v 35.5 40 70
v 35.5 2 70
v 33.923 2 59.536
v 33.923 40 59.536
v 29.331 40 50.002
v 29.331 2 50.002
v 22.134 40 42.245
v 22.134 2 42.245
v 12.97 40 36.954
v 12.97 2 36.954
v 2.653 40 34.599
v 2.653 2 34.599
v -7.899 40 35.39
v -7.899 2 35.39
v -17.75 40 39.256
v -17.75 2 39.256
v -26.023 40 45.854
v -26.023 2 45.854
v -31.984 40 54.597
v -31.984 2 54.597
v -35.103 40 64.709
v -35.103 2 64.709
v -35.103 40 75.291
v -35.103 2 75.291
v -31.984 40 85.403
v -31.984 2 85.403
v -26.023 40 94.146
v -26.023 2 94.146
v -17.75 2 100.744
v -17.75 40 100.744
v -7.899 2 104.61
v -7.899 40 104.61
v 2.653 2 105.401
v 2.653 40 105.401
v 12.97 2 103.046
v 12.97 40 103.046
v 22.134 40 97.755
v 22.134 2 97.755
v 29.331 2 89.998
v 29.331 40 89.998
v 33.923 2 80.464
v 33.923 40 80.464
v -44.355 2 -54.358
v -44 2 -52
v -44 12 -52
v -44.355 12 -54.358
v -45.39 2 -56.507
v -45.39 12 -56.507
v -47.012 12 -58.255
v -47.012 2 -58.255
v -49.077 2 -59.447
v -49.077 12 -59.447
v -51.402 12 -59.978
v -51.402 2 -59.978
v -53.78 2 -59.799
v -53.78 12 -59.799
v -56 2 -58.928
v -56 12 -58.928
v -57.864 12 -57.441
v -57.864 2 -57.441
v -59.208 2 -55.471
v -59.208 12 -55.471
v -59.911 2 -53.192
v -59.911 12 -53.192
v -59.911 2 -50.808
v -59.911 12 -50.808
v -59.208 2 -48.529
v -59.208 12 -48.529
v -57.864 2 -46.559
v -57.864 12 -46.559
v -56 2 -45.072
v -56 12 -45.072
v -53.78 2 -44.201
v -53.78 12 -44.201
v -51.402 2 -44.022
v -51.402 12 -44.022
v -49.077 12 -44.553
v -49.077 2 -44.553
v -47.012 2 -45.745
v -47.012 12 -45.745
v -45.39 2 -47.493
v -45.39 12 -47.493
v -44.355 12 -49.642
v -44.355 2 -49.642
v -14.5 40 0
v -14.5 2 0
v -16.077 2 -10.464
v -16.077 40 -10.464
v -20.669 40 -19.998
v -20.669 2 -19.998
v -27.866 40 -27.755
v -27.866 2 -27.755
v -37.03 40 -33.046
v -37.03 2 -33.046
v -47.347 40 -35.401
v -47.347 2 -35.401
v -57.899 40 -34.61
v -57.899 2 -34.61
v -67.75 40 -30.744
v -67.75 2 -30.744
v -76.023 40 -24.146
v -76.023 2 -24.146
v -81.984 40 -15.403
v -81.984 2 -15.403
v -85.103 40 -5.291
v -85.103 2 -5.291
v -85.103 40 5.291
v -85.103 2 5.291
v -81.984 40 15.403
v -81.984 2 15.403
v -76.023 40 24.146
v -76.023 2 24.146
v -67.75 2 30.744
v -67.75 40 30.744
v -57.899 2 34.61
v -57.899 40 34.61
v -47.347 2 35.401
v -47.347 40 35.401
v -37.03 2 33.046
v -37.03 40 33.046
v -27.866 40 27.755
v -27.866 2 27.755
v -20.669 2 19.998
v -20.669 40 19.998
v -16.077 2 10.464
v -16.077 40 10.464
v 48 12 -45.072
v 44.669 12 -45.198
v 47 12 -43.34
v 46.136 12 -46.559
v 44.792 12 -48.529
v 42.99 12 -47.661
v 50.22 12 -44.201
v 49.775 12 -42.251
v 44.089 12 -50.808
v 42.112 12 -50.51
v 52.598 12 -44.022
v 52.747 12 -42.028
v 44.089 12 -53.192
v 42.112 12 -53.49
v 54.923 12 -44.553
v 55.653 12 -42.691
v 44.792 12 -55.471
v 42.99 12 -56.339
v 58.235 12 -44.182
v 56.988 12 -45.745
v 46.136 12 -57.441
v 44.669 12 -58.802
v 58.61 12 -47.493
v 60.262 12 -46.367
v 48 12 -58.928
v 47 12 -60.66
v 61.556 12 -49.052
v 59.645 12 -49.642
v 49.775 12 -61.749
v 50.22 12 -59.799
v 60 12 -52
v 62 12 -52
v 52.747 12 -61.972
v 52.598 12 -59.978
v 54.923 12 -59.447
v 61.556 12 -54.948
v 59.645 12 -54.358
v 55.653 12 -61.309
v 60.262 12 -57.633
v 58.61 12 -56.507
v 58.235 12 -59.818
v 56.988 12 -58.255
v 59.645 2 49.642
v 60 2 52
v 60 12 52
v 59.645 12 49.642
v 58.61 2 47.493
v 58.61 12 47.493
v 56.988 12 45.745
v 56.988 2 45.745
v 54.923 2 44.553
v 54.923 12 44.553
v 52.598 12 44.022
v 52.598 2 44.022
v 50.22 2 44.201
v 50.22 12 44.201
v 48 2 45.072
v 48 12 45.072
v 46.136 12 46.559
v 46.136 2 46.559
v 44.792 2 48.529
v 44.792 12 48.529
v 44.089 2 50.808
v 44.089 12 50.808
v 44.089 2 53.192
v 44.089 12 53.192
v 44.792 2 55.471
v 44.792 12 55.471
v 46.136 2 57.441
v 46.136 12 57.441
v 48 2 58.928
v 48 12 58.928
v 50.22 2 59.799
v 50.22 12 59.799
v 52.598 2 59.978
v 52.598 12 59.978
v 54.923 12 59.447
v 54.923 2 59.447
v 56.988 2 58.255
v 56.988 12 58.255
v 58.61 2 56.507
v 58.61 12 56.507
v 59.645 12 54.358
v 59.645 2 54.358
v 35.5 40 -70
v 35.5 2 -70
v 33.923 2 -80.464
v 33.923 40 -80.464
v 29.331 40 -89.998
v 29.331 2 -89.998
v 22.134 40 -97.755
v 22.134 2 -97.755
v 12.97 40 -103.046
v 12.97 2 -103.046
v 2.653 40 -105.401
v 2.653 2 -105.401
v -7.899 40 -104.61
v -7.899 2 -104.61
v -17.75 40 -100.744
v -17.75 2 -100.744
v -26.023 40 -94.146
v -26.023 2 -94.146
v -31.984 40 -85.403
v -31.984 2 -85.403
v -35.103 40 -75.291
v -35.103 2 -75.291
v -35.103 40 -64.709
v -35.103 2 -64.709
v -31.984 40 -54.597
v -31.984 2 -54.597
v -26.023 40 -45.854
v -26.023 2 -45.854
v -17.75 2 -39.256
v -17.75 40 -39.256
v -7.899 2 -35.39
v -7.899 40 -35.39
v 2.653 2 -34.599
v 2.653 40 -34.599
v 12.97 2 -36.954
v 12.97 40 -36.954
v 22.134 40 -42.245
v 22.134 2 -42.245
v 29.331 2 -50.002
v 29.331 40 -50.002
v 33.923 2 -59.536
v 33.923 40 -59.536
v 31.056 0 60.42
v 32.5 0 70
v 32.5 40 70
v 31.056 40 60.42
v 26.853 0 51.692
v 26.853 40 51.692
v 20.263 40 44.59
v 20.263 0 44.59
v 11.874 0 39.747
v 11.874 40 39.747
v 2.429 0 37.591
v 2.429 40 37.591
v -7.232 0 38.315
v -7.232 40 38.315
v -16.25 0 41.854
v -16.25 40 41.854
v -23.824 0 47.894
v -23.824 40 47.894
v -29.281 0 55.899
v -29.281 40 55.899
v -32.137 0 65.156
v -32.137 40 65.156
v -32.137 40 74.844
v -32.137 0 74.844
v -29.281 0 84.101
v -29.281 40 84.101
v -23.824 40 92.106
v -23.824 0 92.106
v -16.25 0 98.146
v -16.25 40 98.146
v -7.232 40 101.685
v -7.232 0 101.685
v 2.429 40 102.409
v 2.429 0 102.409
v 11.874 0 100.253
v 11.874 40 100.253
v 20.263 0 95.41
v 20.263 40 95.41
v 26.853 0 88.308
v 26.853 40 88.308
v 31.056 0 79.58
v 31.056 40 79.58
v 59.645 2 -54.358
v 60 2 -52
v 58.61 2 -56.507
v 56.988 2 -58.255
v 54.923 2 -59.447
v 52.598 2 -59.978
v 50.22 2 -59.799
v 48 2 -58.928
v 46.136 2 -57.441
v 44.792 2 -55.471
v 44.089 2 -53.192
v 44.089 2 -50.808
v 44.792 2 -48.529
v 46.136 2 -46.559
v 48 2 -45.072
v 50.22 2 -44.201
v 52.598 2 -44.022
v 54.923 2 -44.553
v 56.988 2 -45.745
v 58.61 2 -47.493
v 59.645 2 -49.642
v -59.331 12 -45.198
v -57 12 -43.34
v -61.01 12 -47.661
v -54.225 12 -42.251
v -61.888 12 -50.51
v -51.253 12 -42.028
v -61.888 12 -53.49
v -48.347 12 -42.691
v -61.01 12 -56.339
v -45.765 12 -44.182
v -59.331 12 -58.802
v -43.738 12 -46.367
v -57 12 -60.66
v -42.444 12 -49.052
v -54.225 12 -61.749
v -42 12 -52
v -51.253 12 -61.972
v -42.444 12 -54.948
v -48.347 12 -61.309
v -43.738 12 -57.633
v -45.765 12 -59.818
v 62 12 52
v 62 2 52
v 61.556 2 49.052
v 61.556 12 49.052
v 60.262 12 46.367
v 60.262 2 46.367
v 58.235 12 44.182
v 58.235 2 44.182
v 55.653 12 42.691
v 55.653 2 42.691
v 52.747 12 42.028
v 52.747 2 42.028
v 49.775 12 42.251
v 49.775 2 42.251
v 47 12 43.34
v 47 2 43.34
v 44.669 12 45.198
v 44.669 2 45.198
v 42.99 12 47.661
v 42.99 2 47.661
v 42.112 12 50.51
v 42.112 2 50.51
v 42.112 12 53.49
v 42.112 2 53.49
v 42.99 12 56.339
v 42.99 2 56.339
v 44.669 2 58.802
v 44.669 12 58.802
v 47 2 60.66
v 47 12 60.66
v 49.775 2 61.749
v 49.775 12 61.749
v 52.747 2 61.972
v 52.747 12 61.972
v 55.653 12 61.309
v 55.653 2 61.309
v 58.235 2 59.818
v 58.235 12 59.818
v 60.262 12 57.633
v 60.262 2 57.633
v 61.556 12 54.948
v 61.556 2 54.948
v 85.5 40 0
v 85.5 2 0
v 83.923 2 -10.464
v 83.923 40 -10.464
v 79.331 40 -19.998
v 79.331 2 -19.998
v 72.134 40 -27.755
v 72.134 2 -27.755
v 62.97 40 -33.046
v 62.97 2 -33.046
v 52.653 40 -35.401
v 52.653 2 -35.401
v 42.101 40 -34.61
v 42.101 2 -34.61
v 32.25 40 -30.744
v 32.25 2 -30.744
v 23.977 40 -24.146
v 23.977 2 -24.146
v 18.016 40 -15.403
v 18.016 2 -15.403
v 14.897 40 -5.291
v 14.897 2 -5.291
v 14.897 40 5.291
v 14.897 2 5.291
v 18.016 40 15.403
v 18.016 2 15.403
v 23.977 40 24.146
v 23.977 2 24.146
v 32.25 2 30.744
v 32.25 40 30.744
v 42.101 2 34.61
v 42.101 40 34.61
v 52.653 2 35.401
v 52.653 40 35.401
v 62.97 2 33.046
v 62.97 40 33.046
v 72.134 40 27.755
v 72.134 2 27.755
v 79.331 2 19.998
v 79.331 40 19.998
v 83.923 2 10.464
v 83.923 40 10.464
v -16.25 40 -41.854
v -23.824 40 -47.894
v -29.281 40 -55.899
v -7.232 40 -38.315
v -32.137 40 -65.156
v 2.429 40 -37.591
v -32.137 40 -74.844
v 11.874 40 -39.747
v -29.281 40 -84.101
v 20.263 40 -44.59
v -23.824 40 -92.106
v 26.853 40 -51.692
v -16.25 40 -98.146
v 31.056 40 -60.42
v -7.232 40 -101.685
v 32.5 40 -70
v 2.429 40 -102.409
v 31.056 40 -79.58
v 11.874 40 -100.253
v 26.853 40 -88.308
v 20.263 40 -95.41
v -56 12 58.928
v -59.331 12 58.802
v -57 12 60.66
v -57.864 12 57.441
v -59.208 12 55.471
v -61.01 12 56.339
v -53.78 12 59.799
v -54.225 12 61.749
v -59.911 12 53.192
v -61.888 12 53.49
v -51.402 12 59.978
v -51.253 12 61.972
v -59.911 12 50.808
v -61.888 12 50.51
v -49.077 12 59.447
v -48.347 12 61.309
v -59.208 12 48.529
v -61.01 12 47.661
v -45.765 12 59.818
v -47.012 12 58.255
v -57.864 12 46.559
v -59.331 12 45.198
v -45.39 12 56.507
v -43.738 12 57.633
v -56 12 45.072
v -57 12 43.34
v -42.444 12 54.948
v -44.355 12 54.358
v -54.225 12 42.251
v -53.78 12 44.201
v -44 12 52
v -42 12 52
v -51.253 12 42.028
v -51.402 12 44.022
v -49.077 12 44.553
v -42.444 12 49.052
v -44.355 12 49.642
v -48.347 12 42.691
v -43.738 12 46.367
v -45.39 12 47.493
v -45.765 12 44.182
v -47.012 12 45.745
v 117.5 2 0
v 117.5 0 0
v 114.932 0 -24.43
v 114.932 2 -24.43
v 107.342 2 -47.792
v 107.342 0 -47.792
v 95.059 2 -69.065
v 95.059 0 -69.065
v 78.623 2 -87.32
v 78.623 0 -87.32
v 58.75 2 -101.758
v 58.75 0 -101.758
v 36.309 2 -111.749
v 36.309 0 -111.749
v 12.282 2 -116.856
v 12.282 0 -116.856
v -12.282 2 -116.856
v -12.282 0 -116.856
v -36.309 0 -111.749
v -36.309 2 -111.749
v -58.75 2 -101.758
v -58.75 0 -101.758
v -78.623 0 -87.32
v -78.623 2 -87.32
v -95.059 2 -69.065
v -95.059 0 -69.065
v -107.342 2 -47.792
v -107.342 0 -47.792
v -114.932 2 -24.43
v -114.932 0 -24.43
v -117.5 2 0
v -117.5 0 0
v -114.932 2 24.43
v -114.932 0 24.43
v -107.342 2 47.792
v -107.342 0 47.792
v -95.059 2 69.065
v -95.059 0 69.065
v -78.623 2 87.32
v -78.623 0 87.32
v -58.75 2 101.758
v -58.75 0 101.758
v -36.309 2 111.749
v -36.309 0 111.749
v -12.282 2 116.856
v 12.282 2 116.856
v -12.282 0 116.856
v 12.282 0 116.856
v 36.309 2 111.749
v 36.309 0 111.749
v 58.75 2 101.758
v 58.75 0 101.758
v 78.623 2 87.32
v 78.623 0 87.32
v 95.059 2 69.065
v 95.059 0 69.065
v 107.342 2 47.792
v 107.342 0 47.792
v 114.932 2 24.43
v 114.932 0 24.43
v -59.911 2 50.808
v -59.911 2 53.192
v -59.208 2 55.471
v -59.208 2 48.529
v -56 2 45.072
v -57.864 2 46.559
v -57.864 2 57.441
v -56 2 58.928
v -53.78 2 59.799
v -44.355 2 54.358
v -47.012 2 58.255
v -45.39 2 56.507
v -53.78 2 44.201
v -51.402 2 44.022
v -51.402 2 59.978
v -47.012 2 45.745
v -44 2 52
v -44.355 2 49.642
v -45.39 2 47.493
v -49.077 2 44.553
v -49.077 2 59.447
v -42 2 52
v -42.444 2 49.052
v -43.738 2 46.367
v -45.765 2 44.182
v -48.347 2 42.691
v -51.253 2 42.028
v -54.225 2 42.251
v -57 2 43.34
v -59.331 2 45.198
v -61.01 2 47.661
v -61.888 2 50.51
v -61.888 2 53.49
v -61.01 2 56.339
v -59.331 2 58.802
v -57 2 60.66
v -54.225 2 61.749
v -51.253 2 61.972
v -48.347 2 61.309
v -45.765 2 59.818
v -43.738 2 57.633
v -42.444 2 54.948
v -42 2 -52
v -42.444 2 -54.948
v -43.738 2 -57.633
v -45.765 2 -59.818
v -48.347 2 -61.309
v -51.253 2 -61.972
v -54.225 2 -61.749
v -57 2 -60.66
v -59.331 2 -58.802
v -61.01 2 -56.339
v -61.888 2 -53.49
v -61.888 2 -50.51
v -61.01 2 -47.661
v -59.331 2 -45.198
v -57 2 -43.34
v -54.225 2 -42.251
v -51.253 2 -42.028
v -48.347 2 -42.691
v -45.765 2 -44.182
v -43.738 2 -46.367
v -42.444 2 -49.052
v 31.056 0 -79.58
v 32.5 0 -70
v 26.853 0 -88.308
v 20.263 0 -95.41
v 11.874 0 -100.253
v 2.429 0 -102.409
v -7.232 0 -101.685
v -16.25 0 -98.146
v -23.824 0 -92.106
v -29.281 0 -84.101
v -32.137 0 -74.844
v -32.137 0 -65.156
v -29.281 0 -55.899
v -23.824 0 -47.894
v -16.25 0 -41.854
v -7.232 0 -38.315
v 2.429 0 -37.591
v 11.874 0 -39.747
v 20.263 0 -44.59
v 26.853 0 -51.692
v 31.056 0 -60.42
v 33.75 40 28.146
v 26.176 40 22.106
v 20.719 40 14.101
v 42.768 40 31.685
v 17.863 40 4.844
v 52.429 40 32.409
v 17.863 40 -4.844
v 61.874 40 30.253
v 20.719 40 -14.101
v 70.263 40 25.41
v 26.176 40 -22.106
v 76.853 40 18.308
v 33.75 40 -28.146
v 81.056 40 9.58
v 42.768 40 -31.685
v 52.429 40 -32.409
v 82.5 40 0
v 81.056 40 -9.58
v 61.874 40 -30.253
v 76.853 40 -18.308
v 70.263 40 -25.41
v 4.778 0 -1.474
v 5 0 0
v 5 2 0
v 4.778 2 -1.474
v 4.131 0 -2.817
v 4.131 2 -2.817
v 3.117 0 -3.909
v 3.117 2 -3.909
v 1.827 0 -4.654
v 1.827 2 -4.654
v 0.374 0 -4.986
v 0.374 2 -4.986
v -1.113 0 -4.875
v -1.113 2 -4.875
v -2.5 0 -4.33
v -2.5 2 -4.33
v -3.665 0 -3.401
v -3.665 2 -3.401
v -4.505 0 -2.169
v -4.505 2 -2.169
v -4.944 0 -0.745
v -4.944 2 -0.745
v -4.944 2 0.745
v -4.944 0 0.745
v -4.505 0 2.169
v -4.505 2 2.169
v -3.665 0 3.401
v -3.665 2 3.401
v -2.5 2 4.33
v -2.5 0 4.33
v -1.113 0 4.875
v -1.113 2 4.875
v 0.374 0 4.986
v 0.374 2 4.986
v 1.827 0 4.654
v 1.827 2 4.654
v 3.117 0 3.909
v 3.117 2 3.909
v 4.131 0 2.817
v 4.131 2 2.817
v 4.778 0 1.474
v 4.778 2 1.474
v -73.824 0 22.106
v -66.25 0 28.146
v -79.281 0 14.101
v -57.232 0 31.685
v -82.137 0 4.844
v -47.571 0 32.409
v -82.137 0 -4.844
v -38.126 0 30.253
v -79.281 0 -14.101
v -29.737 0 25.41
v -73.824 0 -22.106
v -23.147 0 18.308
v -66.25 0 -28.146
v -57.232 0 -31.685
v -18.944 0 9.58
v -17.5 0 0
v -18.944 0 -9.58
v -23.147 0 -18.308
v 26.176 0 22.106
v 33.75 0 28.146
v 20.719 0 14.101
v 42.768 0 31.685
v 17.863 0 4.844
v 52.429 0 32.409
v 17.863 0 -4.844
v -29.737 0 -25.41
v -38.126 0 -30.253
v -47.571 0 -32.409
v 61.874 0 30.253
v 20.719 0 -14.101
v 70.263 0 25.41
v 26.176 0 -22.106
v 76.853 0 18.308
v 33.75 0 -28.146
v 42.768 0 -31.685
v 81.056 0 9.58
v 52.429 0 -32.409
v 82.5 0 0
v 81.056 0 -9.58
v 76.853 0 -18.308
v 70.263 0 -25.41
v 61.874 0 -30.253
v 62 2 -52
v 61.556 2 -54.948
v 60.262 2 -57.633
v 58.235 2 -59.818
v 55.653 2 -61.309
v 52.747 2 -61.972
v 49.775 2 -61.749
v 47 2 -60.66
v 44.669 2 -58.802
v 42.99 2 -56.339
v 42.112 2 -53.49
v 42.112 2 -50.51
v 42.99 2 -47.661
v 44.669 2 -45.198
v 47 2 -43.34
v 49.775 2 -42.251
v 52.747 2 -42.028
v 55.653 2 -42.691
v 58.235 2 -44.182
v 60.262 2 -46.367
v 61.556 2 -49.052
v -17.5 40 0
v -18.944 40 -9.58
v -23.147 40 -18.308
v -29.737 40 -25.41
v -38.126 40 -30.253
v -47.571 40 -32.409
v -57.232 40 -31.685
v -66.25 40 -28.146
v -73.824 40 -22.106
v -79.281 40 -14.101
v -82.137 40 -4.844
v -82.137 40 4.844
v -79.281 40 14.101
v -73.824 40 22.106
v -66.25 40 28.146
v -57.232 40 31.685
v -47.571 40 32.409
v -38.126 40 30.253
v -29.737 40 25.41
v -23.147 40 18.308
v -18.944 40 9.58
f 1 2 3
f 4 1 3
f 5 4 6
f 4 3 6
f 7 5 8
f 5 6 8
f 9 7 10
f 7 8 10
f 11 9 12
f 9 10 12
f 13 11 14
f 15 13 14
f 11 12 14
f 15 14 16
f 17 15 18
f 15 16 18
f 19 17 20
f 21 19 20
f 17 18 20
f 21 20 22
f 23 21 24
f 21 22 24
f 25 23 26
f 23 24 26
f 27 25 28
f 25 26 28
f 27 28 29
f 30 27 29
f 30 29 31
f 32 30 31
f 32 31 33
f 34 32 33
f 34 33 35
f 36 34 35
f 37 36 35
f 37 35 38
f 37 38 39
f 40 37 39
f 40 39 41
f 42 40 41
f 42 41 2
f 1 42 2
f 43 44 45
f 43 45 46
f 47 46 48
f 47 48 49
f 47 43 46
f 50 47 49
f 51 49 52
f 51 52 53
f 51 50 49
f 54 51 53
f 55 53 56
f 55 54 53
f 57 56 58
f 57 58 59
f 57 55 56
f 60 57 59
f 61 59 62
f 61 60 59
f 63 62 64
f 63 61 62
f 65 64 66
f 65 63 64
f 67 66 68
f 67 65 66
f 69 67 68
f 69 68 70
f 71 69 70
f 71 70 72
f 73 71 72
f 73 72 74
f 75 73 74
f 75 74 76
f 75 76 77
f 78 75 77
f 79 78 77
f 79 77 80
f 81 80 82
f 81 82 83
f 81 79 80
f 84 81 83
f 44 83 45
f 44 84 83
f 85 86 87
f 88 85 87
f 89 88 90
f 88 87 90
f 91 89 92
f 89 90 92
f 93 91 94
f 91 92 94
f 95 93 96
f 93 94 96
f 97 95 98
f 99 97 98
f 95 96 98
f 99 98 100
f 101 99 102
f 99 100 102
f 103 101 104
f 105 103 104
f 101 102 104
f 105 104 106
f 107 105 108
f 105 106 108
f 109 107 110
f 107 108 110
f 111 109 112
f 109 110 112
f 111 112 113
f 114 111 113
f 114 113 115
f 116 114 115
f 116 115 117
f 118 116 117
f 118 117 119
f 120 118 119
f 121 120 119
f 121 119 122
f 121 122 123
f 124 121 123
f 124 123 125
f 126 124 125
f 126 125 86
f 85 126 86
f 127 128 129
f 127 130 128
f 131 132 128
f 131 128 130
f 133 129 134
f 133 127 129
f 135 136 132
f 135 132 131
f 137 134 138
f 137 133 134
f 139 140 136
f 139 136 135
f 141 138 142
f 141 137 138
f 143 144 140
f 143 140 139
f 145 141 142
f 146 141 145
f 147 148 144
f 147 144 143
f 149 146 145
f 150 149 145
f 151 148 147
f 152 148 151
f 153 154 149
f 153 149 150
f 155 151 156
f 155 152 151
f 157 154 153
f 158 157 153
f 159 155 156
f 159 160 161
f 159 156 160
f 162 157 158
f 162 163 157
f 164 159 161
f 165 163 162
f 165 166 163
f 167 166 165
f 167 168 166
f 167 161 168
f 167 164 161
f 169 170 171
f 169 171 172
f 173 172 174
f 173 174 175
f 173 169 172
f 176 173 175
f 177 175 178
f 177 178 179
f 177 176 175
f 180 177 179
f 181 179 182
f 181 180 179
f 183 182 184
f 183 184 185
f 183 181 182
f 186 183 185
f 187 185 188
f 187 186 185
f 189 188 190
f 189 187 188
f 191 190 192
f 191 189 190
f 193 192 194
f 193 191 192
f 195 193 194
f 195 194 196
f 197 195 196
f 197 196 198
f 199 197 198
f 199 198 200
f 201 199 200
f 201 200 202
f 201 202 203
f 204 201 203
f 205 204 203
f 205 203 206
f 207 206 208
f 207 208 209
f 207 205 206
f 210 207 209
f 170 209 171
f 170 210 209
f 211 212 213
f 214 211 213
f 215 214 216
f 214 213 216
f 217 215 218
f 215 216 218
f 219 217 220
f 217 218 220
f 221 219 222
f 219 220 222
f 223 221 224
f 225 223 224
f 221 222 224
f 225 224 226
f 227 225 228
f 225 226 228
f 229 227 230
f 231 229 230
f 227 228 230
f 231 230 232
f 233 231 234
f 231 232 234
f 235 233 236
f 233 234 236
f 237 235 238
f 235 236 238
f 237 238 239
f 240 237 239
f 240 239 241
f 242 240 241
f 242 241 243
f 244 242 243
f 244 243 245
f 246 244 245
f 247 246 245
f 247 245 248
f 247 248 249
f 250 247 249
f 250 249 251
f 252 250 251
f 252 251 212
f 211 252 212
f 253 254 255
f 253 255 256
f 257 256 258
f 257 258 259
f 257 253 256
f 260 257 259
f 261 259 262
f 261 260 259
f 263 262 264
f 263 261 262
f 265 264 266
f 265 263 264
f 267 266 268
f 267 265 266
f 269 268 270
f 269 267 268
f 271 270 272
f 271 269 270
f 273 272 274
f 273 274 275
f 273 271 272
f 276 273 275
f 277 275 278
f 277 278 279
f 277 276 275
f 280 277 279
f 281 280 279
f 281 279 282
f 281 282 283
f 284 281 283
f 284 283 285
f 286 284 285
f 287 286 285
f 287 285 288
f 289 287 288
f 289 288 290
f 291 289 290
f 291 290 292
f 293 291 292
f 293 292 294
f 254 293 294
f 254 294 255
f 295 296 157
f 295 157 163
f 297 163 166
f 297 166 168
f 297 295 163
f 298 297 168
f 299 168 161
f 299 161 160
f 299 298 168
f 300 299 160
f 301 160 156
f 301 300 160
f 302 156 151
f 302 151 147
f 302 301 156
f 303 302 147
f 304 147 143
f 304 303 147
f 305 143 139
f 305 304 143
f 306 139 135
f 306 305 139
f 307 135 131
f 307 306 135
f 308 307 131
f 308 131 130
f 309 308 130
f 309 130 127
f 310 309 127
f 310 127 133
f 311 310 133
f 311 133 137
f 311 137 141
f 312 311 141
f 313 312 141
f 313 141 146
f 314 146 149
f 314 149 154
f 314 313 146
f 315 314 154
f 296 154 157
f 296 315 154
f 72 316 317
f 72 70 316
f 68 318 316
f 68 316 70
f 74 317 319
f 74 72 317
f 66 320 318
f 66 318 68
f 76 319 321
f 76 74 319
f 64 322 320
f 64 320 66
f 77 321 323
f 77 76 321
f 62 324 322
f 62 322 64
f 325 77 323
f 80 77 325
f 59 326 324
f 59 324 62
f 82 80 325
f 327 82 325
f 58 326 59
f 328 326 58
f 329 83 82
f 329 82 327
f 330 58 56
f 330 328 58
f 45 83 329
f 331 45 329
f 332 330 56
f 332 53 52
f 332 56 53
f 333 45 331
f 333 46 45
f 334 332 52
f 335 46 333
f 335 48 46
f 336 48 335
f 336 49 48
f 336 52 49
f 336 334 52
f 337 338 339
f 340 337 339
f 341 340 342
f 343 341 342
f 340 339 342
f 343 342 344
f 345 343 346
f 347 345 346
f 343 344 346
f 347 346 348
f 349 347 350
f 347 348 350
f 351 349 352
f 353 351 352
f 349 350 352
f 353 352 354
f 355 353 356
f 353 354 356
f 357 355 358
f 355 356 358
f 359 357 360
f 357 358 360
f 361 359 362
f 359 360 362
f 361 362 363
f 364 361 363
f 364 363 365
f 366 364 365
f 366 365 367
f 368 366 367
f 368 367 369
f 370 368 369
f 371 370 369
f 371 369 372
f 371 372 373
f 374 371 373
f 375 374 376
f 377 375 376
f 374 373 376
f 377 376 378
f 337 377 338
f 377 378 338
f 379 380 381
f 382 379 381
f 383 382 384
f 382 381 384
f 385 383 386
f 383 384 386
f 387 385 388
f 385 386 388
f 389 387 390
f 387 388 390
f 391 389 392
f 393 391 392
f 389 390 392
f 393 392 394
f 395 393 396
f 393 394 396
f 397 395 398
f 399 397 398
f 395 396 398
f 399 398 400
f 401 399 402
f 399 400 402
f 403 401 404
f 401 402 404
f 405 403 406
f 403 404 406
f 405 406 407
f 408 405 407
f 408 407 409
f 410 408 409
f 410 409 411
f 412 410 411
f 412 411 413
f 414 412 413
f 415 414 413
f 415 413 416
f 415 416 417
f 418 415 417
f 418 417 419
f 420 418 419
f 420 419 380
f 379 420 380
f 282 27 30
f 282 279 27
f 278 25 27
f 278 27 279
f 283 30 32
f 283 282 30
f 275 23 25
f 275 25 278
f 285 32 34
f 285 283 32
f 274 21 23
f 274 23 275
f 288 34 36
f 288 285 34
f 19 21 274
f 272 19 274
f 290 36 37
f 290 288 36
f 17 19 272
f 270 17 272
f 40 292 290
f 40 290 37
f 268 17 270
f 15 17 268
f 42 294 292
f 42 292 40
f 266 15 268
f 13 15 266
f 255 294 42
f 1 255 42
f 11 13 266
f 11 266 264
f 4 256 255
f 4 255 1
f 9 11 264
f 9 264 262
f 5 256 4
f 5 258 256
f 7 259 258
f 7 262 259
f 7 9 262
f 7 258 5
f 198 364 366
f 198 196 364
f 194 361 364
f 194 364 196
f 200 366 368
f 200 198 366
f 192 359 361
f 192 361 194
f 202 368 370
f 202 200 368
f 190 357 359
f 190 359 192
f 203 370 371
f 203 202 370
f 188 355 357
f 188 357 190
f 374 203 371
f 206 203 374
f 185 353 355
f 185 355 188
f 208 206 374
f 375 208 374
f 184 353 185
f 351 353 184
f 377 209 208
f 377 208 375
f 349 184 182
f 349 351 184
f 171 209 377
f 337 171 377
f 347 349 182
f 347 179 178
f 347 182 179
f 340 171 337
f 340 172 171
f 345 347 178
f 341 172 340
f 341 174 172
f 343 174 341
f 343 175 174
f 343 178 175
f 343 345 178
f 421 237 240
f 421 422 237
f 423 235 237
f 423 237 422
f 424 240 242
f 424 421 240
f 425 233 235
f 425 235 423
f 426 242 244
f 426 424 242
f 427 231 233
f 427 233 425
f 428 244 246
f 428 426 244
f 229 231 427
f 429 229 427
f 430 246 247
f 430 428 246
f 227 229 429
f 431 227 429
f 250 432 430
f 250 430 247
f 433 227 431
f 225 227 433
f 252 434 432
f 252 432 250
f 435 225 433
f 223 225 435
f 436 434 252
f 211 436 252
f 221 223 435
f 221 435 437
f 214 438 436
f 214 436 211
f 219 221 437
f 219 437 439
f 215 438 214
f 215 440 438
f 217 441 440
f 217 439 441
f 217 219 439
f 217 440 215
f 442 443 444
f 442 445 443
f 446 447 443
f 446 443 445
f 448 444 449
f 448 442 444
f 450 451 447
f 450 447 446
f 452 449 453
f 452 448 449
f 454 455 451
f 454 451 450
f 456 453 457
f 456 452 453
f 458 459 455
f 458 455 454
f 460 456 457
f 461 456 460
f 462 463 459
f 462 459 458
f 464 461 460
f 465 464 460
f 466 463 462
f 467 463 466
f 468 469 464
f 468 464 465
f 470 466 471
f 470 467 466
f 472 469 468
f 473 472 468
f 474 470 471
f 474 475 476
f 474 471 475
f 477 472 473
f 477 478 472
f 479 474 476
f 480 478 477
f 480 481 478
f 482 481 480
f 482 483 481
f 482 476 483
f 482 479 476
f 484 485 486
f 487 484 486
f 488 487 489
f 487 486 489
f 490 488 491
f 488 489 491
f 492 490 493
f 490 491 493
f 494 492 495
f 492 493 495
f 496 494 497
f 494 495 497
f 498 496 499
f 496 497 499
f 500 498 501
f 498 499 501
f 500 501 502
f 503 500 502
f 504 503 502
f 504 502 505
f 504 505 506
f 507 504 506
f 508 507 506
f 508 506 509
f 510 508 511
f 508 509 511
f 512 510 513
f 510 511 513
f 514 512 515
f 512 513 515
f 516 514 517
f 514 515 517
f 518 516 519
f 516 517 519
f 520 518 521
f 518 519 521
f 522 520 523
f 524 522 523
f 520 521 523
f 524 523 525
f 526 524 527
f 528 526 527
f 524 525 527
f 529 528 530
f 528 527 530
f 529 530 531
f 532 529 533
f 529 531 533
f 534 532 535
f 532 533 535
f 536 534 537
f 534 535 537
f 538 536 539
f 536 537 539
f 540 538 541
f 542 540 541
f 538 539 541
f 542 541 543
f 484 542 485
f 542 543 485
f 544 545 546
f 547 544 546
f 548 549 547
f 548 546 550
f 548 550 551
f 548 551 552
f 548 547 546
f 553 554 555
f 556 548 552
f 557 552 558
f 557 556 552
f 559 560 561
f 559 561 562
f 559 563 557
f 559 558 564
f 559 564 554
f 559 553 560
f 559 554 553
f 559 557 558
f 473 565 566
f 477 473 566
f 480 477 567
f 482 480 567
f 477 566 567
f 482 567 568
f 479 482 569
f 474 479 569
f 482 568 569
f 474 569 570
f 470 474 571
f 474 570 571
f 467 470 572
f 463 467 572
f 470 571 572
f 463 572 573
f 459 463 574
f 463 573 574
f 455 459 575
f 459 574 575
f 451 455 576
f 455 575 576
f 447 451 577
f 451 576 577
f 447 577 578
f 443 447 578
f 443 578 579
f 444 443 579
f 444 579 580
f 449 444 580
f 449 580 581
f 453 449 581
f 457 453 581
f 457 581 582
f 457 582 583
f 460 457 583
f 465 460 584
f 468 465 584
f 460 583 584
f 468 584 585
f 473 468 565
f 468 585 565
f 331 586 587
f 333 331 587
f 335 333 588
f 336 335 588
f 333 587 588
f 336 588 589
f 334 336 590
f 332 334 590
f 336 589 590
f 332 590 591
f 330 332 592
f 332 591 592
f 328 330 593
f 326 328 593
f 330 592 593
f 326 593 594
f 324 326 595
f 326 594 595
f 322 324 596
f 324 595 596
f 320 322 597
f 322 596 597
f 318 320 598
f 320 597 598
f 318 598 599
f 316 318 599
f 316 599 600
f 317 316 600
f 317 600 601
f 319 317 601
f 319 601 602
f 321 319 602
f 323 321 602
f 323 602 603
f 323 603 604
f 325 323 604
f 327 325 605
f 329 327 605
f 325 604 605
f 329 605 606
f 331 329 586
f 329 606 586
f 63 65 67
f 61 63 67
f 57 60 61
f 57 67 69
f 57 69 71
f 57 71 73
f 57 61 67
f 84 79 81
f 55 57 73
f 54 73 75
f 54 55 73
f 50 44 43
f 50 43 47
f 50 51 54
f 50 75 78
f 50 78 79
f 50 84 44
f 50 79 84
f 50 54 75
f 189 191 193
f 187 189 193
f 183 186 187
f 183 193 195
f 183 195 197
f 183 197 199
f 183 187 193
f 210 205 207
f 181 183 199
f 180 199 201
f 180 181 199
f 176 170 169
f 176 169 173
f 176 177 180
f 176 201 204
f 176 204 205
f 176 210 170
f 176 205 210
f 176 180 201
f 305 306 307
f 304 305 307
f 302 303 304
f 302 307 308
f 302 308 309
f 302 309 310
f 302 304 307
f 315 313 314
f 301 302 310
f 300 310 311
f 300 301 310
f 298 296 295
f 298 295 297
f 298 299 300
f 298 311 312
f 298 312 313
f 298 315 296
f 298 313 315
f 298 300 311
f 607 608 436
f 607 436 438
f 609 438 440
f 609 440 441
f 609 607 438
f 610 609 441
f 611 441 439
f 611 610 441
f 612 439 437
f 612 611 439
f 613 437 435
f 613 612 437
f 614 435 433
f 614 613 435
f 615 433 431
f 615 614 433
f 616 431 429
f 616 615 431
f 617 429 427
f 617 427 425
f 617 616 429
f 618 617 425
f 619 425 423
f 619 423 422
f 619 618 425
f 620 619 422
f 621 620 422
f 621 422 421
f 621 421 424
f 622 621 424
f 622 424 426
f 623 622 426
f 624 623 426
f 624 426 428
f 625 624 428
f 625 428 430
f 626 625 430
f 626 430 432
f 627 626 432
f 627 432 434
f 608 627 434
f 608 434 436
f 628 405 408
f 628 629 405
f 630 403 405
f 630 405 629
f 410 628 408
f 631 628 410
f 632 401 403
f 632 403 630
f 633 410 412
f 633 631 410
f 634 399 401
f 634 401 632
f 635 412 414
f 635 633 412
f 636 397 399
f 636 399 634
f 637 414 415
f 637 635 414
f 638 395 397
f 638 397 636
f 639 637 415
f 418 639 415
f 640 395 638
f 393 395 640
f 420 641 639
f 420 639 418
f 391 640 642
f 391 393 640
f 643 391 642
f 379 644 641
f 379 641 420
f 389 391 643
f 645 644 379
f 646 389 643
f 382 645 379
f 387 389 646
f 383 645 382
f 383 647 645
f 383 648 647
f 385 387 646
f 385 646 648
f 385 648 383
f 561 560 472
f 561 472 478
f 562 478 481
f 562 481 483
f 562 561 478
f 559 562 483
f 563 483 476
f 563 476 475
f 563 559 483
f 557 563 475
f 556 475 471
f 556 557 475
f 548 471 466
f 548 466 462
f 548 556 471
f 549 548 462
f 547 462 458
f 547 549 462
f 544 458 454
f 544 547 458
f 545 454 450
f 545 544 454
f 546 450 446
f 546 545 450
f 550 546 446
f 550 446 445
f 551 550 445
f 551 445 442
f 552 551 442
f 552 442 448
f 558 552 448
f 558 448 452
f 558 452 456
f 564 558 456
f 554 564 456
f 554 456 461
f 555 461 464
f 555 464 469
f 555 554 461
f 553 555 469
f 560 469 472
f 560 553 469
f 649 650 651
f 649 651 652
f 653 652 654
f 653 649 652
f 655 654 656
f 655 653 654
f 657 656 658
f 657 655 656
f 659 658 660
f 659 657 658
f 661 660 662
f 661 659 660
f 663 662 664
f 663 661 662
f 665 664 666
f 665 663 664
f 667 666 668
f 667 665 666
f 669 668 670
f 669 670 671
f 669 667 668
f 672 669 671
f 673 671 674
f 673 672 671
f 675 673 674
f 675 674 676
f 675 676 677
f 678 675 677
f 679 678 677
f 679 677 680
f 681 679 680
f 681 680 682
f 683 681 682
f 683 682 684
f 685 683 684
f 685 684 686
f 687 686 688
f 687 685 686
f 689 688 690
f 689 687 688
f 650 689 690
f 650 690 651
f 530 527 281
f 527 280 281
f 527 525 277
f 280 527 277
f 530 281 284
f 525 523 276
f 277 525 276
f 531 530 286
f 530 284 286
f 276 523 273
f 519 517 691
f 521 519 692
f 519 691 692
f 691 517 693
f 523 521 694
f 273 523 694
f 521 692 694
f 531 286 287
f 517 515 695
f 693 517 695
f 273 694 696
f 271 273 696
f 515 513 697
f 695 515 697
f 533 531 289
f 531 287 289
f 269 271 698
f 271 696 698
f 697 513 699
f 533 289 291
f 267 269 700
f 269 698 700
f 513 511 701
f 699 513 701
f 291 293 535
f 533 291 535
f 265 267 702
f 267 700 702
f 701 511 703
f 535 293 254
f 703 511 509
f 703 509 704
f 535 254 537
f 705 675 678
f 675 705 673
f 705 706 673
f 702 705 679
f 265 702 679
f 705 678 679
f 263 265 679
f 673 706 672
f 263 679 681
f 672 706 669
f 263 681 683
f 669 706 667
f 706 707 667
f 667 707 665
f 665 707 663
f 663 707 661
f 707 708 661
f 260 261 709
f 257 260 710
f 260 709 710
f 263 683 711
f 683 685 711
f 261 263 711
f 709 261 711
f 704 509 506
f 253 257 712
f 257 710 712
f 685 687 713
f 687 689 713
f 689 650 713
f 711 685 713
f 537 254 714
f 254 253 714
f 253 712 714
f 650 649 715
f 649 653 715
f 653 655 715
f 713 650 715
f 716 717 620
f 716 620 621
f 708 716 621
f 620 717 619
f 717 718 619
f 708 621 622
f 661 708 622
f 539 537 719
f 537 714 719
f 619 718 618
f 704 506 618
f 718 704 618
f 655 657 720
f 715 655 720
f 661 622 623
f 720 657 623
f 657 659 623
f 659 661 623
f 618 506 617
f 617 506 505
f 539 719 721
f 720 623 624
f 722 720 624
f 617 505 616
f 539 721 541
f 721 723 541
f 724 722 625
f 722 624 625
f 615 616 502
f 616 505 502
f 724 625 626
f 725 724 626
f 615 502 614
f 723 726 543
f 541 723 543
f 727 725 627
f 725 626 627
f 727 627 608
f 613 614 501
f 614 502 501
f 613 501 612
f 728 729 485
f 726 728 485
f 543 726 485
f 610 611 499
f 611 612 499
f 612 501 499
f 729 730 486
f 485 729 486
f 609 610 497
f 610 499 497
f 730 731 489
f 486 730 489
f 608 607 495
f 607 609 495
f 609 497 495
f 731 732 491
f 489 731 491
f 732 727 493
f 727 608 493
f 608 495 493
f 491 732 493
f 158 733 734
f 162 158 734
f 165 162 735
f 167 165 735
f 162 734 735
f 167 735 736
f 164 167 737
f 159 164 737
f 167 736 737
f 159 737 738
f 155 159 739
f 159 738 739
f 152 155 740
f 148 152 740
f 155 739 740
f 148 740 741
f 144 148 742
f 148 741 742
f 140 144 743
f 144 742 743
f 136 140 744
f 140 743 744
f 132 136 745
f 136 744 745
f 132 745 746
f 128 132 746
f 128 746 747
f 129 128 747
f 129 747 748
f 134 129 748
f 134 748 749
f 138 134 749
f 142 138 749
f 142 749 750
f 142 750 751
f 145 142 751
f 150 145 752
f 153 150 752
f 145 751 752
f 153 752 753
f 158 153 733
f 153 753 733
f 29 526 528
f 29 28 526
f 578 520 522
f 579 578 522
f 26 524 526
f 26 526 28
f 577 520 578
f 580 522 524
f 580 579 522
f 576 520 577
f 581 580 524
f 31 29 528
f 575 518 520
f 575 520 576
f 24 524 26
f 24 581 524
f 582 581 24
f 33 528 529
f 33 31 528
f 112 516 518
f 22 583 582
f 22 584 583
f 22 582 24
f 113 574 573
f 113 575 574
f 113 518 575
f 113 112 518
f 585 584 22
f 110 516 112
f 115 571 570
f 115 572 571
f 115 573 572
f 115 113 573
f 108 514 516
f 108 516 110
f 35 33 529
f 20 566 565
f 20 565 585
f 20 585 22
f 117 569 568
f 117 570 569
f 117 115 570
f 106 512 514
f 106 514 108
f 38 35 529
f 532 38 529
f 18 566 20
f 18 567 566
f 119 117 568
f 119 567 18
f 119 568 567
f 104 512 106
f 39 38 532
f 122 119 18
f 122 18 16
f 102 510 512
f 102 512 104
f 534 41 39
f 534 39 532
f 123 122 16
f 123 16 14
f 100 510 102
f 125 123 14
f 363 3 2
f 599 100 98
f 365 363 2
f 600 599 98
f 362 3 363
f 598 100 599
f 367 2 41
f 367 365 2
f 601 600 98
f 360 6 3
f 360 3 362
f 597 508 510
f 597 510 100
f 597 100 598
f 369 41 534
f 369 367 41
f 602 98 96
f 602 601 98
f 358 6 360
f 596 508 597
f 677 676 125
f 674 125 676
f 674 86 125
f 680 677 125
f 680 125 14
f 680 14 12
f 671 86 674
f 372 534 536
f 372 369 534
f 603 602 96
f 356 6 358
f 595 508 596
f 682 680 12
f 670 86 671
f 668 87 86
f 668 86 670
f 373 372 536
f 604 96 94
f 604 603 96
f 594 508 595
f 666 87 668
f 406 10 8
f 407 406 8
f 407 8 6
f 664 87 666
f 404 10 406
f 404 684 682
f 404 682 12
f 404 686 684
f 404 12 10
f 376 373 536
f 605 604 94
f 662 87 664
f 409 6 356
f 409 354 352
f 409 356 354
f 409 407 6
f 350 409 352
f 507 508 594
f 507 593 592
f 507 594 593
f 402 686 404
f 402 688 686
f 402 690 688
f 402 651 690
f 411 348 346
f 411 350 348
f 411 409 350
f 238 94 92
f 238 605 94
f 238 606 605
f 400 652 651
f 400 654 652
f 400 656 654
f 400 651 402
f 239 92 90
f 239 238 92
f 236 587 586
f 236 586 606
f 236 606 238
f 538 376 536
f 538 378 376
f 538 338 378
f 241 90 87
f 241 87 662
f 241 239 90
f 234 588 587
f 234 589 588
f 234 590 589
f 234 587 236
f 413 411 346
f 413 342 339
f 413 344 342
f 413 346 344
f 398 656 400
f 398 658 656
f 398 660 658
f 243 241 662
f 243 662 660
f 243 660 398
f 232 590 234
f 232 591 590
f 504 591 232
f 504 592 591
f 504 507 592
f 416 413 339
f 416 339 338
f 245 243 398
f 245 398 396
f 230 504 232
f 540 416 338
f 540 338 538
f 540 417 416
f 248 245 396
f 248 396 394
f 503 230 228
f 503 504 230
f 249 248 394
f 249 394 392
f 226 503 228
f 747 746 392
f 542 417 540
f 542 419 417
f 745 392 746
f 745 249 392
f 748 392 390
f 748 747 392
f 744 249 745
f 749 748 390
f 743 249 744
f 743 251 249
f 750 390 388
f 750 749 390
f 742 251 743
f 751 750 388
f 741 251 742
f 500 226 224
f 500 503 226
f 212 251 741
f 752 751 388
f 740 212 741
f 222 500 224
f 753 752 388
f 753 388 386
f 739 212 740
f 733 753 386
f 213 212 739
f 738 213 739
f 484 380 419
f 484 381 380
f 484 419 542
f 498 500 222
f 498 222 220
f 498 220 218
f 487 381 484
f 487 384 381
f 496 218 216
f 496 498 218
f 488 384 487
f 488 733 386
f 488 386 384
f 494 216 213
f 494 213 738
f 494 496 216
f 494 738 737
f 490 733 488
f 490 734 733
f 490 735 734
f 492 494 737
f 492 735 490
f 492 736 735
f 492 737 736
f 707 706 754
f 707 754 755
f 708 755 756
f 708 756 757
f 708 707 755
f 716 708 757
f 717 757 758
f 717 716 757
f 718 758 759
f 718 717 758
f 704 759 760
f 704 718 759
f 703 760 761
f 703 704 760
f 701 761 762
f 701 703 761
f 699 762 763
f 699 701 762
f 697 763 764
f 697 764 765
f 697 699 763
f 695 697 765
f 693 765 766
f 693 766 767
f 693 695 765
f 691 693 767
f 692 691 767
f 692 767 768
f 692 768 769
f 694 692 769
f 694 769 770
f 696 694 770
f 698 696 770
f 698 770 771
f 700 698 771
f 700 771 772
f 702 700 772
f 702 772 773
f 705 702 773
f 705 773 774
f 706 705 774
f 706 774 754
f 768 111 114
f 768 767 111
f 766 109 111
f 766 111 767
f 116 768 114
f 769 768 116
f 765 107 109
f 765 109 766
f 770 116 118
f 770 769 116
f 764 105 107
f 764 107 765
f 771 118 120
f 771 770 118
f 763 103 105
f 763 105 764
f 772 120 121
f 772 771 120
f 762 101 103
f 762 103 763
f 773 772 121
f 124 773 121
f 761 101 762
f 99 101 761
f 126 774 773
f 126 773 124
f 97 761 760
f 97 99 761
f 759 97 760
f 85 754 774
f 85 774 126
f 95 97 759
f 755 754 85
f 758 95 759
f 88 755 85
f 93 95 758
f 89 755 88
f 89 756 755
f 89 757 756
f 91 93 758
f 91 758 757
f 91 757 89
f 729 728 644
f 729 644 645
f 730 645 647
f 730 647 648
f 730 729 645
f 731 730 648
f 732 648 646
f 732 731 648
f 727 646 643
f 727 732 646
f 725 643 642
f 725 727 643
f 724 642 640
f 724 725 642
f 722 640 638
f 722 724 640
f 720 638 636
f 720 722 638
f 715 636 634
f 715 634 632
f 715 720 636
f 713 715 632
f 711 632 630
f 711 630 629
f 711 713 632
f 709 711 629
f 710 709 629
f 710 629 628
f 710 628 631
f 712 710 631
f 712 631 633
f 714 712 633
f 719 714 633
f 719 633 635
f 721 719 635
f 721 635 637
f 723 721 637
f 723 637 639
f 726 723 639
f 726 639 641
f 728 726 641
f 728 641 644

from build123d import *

# Parameters (mm, degrees)
IZIM1_R                     = 117.5
IZIM1_R_2                   = 32.5
IZIM1_R_3                   = 5
Y_KSEKLIK_EKSTR_ZYON1_DEPTH = 2
IZIM1_2_R                   = 35.5
IZIM1_2_R_2                 = 32.5
EKSTR_ZYON_NCE1_DEPTH       = 40
IZIM2_R                     = 10
IZIM2_R_2                   = 8
EKSTR_ZYON_NCE2_DEPTH       = 10


with BuildPart() as part:
    # Çizim1 → Yükseklik-Ekstrüzyon1 (new body)
    with BuildSketch(Plane(origin=(0, 0, 0), x_dir=(1, 0, 0), z_dir=(0, 1, 0))):
        Circle(IZIM1_R)
        with Locations((0, 70)):
            Circle(IZIM1_R_2, mode=Mode.SUBTRACT)
        with Locations((50, 0)):
            Circle(IZIM1_R_2, mode=Mode.SUBTRACT)
        with Locations((0, -70)):
            Circle(IZIM1_R_2, mode=Mode.SUBTRACT)
        with Locations((-50, 0)):
            Circle(IZIM1_R_2, mode=Mode.SUBTRACT)
        Circle(IZIM1_R_3, mode=Mode.SUBTRACT)
    extrude(amount=Y_KSEKLIK_EKSTR_ZYON1_DEPTH)

    # Çizim1<2> → Ekstrüzyon-İnce1 (add)
    with BuildSketch(Plane(origin=(0, 0, 0), x_dir=(1, 0, 0), z_dir=(0, 1, 0))):
        with Locations((0, 70)):
            Circle(IZIM1_2_R)
        with Locations((0, 70)):
            Circle(IZIM1_2_R_2, mode=Mode.SUBTRACT)
        with Locations((50, 0)):
            Circle(IZIM1_2_R)
        with Locations((50, 0)):
            Circle(IZIM1_2_R_2, mode=Mode.SUBTRACT)
        with Locations((0, -70)):
            Circle(IZIM1_2_R)
        with Locations((0, -70)):
            Circle(IZIM1_2_R_2, mode=Mode.SUBTRACT)
        with Locations((-50, 0)):
            Circle(IZIM1_2_R)
        with Locations((-50, 0)):
            Circle(IZIM1_2_R_2, mode=Mode.SUBTRACT)
    extrude(amount=EKSTR_ZYON_NCE1_DEPTH)

    # Çizim2 → Ekstrüzyon-İnce2 (add)
    with BuildSketch(Plane(origin=(0, 2, 0), x_dir=(1, 0, 0), z_dir=(0, 1, 0))):
        with Locations((52, -52)):
            Circle(IZIM2_R)
        with Locations((52, -52)):
            Circle(IZIM2_R_2, mode=Mode.SUBTRACT)
        with Locations((-52, -52)):
            Circle(IZIM2_R)
        with Locations((-52, -52)):
            Circle(IZIM2_R_2, mode=Mode.SUBTRACT)
        with Locations((-52, 52)):
            Circle(IZIM2_R)
        with Locations((-52, 52)):
            Circle(IZIM2_R_2, mode=Mode.SUBTRACT)
        with Locations((52, 52)):
            Circle(IZIM2_R)
        with Locations((52, 52)):
            Circle(IZIM2_R_2, mode=Mode.SUBTRACT)
    extrude(amount=EKSTR_ZYON_NCE2_DEPTH)


solid = part.part
